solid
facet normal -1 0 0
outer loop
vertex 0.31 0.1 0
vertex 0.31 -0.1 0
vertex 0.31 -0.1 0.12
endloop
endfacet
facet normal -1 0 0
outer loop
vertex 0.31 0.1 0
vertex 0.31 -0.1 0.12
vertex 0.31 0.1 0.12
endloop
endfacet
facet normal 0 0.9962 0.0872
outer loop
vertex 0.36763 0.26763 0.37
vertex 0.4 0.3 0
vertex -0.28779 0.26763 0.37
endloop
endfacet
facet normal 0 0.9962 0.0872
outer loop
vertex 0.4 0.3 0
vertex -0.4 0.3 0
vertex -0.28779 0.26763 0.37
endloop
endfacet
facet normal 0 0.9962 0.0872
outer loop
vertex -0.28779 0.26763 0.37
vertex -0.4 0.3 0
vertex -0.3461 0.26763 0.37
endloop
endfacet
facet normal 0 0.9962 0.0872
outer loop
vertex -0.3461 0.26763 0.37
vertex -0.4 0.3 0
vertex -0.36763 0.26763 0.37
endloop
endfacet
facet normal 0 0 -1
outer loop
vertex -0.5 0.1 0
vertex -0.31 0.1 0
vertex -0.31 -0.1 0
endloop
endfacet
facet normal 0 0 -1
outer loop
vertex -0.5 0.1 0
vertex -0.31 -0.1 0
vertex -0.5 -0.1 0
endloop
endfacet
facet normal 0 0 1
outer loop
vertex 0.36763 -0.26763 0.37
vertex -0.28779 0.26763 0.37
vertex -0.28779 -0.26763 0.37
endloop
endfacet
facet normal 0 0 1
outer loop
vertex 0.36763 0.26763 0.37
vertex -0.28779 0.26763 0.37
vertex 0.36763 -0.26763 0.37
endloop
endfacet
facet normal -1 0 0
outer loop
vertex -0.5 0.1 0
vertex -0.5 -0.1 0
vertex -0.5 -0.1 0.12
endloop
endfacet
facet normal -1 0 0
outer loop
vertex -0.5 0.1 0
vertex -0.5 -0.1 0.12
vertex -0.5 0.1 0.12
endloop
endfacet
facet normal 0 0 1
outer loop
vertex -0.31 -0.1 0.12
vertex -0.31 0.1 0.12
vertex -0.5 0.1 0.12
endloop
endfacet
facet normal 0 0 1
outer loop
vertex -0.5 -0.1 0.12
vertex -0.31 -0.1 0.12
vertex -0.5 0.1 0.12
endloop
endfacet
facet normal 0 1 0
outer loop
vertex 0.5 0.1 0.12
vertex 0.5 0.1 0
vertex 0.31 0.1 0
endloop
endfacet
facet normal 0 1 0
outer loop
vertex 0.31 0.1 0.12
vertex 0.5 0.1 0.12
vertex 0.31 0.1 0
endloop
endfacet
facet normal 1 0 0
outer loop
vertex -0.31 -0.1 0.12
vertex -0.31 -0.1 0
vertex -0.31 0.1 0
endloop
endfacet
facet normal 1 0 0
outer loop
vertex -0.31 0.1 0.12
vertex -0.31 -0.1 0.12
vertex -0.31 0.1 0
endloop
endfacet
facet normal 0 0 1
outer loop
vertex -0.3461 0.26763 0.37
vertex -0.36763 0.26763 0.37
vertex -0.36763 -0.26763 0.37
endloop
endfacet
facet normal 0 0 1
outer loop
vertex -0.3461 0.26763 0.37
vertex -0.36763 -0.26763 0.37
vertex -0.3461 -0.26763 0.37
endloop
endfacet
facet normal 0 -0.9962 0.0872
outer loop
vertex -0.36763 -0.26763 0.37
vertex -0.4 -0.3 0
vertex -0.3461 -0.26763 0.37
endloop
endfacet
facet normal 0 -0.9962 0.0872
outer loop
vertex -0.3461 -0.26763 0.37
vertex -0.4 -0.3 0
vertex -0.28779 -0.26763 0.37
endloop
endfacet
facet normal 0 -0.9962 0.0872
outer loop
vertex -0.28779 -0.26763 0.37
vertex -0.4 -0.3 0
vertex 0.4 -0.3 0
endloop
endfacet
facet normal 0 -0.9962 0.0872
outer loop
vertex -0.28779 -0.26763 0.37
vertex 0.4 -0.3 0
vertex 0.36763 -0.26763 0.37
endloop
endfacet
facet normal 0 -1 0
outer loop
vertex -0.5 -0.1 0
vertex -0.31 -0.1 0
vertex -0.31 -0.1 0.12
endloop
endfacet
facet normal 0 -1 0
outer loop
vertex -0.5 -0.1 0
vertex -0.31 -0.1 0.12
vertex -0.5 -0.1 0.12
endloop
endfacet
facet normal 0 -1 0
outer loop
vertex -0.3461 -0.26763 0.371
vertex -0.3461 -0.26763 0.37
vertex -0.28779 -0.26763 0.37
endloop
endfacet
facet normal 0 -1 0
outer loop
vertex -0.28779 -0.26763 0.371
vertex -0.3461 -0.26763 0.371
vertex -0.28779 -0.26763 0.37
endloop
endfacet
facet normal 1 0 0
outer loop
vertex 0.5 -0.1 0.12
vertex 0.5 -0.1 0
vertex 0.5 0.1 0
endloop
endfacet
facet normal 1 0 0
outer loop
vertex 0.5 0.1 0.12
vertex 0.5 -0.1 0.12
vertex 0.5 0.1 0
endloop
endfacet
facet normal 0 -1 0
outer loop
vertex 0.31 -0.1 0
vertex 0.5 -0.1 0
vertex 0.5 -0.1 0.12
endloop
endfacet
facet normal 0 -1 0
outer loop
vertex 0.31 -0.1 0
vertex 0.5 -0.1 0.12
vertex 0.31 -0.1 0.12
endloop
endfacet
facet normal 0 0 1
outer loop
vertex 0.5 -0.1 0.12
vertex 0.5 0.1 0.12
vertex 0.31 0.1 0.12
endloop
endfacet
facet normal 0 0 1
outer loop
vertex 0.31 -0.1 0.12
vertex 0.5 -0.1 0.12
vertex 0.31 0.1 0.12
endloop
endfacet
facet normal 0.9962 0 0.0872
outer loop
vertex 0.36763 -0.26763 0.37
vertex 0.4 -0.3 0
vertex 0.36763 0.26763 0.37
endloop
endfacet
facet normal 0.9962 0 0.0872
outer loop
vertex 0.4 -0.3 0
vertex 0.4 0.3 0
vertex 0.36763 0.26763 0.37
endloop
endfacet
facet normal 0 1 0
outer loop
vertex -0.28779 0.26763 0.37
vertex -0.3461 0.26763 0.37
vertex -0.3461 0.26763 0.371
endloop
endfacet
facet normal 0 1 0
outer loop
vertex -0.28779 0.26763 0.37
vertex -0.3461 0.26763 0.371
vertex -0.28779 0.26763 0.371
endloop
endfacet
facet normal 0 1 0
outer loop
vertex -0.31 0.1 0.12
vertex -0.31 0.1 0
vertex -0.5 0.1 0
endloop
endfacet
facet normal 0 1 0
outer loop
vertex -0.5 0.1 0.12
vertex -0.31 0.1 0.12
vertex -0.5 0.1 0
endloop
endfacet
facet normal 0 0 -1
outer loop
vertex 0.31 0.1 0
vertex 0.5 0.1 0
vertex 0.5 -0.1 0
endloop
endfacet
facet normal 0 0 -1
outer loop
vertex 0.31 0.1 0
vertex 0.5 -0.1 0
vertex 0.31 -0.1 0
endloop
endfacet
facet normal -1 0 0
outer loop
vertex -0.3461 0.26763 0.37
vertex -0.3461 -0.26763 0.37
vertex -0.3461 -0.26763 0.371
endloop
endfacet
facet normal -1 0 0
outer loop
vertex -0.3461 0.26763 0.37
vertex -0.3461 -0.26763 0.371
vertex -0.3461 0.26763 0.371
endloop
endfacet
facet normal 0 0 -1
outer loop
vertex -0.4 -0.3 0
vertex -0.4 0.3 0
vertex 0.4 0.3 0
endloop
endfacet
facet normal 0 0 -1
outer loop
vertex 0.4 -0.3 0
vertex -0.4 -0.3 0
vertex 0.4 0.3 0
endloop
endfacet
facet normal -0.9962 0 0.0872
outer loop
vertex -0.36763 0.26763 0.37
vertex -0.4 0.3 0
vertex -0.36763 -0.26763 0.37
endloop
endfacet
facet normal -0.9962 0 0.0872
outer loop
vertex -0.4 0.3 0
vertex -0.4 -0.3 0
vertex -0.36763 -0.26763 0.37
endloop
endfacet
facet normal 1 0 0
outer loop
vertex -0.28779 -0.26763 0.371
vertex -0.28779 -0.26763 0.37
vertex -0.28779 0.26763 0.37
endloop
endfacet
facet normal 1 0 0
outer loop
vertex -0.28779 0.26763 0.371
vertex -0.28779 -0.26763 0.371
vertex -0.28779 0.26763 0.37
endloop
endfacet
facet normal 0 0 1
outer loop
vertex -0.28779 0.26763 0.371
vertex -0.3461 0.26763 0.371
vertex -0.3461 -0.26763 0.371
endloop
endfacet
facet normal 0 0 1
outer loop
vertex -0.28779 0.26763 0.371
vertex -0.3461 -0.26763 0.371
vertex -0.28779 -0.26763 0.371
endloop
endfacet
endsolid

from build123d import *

# Parameters (mm, degrees)
SKETCH1_W             = 0.8
SKETCH1_H             = 0.6
BOSS_EXTRUDE1_DEPTH   = 0.37
BOSS_EXTRUDE1_TAPER   = 5
SKETCH2_W             = 0.19
SKETCH2_H             = 0.2
BOSS_EXTRUDE2_DEPTH   = 0.12
BOSS_EXTRUDE2_2_DEPTH = 0.12
SKETCH3_W             = 0.058316593
SKETCH3_H             = 0.535258388
BOSS_EXTRUDE3_DEPTH   = 0.001


with BuildPart() as part:
    # Sketch1 → Boss-Extrude1 (new body)
    with BuildSketch(Plane.XY):
        Rectangle(SKETCH1_W, SKETCH1_H)
    extrude(amount=BOSS_EXTRUDE1_DEPTH, taper=BOSS_EXTRUDE1_TAPER)

    # Sketch3 → Boss-Extrude3 (add)
    with BuildSketch(Plane.XY.offset(0.37)):
        with Locations((-0.316946175, 0)):
            Rectangle(SKETCH3_W, SKETCH3_H)
    extrude(amount=BOSS_EXTRUDE3_DEPTH)


with BuildPart() as body_2:
    # Sketch2 → Boss-Extrude2 (new body)
    with BuildSketch(Plane(origin=(0, 0, 0), x_dir=(-1, 0, 0), z_dir=(0, 0, -1))):
        with Locations((0.405, 0)):
            Rectangle(SKETCH2_W, SKETCH2_H)
    extrude(amount=-BOSS_EXTRUDE2_DEPTH)


with BuildPart() as body_3:
    # Sketch2 → Boss-Extrude2 2 (new body)
    with BuildSketch(Plane(origin=(0, 0, 0), x_dir=(-1, 0, 0), z_dir=(0, 0, -1))):
        with Locations((-0.405, 0)):
            Rectangle(SKETCH2_W, SKETCH2_H)
    extrude(amount=-BOSS_EXTRUDE2_2_DEPTH)


solid = Compound([part.part, body_2.part, body_3.part])
